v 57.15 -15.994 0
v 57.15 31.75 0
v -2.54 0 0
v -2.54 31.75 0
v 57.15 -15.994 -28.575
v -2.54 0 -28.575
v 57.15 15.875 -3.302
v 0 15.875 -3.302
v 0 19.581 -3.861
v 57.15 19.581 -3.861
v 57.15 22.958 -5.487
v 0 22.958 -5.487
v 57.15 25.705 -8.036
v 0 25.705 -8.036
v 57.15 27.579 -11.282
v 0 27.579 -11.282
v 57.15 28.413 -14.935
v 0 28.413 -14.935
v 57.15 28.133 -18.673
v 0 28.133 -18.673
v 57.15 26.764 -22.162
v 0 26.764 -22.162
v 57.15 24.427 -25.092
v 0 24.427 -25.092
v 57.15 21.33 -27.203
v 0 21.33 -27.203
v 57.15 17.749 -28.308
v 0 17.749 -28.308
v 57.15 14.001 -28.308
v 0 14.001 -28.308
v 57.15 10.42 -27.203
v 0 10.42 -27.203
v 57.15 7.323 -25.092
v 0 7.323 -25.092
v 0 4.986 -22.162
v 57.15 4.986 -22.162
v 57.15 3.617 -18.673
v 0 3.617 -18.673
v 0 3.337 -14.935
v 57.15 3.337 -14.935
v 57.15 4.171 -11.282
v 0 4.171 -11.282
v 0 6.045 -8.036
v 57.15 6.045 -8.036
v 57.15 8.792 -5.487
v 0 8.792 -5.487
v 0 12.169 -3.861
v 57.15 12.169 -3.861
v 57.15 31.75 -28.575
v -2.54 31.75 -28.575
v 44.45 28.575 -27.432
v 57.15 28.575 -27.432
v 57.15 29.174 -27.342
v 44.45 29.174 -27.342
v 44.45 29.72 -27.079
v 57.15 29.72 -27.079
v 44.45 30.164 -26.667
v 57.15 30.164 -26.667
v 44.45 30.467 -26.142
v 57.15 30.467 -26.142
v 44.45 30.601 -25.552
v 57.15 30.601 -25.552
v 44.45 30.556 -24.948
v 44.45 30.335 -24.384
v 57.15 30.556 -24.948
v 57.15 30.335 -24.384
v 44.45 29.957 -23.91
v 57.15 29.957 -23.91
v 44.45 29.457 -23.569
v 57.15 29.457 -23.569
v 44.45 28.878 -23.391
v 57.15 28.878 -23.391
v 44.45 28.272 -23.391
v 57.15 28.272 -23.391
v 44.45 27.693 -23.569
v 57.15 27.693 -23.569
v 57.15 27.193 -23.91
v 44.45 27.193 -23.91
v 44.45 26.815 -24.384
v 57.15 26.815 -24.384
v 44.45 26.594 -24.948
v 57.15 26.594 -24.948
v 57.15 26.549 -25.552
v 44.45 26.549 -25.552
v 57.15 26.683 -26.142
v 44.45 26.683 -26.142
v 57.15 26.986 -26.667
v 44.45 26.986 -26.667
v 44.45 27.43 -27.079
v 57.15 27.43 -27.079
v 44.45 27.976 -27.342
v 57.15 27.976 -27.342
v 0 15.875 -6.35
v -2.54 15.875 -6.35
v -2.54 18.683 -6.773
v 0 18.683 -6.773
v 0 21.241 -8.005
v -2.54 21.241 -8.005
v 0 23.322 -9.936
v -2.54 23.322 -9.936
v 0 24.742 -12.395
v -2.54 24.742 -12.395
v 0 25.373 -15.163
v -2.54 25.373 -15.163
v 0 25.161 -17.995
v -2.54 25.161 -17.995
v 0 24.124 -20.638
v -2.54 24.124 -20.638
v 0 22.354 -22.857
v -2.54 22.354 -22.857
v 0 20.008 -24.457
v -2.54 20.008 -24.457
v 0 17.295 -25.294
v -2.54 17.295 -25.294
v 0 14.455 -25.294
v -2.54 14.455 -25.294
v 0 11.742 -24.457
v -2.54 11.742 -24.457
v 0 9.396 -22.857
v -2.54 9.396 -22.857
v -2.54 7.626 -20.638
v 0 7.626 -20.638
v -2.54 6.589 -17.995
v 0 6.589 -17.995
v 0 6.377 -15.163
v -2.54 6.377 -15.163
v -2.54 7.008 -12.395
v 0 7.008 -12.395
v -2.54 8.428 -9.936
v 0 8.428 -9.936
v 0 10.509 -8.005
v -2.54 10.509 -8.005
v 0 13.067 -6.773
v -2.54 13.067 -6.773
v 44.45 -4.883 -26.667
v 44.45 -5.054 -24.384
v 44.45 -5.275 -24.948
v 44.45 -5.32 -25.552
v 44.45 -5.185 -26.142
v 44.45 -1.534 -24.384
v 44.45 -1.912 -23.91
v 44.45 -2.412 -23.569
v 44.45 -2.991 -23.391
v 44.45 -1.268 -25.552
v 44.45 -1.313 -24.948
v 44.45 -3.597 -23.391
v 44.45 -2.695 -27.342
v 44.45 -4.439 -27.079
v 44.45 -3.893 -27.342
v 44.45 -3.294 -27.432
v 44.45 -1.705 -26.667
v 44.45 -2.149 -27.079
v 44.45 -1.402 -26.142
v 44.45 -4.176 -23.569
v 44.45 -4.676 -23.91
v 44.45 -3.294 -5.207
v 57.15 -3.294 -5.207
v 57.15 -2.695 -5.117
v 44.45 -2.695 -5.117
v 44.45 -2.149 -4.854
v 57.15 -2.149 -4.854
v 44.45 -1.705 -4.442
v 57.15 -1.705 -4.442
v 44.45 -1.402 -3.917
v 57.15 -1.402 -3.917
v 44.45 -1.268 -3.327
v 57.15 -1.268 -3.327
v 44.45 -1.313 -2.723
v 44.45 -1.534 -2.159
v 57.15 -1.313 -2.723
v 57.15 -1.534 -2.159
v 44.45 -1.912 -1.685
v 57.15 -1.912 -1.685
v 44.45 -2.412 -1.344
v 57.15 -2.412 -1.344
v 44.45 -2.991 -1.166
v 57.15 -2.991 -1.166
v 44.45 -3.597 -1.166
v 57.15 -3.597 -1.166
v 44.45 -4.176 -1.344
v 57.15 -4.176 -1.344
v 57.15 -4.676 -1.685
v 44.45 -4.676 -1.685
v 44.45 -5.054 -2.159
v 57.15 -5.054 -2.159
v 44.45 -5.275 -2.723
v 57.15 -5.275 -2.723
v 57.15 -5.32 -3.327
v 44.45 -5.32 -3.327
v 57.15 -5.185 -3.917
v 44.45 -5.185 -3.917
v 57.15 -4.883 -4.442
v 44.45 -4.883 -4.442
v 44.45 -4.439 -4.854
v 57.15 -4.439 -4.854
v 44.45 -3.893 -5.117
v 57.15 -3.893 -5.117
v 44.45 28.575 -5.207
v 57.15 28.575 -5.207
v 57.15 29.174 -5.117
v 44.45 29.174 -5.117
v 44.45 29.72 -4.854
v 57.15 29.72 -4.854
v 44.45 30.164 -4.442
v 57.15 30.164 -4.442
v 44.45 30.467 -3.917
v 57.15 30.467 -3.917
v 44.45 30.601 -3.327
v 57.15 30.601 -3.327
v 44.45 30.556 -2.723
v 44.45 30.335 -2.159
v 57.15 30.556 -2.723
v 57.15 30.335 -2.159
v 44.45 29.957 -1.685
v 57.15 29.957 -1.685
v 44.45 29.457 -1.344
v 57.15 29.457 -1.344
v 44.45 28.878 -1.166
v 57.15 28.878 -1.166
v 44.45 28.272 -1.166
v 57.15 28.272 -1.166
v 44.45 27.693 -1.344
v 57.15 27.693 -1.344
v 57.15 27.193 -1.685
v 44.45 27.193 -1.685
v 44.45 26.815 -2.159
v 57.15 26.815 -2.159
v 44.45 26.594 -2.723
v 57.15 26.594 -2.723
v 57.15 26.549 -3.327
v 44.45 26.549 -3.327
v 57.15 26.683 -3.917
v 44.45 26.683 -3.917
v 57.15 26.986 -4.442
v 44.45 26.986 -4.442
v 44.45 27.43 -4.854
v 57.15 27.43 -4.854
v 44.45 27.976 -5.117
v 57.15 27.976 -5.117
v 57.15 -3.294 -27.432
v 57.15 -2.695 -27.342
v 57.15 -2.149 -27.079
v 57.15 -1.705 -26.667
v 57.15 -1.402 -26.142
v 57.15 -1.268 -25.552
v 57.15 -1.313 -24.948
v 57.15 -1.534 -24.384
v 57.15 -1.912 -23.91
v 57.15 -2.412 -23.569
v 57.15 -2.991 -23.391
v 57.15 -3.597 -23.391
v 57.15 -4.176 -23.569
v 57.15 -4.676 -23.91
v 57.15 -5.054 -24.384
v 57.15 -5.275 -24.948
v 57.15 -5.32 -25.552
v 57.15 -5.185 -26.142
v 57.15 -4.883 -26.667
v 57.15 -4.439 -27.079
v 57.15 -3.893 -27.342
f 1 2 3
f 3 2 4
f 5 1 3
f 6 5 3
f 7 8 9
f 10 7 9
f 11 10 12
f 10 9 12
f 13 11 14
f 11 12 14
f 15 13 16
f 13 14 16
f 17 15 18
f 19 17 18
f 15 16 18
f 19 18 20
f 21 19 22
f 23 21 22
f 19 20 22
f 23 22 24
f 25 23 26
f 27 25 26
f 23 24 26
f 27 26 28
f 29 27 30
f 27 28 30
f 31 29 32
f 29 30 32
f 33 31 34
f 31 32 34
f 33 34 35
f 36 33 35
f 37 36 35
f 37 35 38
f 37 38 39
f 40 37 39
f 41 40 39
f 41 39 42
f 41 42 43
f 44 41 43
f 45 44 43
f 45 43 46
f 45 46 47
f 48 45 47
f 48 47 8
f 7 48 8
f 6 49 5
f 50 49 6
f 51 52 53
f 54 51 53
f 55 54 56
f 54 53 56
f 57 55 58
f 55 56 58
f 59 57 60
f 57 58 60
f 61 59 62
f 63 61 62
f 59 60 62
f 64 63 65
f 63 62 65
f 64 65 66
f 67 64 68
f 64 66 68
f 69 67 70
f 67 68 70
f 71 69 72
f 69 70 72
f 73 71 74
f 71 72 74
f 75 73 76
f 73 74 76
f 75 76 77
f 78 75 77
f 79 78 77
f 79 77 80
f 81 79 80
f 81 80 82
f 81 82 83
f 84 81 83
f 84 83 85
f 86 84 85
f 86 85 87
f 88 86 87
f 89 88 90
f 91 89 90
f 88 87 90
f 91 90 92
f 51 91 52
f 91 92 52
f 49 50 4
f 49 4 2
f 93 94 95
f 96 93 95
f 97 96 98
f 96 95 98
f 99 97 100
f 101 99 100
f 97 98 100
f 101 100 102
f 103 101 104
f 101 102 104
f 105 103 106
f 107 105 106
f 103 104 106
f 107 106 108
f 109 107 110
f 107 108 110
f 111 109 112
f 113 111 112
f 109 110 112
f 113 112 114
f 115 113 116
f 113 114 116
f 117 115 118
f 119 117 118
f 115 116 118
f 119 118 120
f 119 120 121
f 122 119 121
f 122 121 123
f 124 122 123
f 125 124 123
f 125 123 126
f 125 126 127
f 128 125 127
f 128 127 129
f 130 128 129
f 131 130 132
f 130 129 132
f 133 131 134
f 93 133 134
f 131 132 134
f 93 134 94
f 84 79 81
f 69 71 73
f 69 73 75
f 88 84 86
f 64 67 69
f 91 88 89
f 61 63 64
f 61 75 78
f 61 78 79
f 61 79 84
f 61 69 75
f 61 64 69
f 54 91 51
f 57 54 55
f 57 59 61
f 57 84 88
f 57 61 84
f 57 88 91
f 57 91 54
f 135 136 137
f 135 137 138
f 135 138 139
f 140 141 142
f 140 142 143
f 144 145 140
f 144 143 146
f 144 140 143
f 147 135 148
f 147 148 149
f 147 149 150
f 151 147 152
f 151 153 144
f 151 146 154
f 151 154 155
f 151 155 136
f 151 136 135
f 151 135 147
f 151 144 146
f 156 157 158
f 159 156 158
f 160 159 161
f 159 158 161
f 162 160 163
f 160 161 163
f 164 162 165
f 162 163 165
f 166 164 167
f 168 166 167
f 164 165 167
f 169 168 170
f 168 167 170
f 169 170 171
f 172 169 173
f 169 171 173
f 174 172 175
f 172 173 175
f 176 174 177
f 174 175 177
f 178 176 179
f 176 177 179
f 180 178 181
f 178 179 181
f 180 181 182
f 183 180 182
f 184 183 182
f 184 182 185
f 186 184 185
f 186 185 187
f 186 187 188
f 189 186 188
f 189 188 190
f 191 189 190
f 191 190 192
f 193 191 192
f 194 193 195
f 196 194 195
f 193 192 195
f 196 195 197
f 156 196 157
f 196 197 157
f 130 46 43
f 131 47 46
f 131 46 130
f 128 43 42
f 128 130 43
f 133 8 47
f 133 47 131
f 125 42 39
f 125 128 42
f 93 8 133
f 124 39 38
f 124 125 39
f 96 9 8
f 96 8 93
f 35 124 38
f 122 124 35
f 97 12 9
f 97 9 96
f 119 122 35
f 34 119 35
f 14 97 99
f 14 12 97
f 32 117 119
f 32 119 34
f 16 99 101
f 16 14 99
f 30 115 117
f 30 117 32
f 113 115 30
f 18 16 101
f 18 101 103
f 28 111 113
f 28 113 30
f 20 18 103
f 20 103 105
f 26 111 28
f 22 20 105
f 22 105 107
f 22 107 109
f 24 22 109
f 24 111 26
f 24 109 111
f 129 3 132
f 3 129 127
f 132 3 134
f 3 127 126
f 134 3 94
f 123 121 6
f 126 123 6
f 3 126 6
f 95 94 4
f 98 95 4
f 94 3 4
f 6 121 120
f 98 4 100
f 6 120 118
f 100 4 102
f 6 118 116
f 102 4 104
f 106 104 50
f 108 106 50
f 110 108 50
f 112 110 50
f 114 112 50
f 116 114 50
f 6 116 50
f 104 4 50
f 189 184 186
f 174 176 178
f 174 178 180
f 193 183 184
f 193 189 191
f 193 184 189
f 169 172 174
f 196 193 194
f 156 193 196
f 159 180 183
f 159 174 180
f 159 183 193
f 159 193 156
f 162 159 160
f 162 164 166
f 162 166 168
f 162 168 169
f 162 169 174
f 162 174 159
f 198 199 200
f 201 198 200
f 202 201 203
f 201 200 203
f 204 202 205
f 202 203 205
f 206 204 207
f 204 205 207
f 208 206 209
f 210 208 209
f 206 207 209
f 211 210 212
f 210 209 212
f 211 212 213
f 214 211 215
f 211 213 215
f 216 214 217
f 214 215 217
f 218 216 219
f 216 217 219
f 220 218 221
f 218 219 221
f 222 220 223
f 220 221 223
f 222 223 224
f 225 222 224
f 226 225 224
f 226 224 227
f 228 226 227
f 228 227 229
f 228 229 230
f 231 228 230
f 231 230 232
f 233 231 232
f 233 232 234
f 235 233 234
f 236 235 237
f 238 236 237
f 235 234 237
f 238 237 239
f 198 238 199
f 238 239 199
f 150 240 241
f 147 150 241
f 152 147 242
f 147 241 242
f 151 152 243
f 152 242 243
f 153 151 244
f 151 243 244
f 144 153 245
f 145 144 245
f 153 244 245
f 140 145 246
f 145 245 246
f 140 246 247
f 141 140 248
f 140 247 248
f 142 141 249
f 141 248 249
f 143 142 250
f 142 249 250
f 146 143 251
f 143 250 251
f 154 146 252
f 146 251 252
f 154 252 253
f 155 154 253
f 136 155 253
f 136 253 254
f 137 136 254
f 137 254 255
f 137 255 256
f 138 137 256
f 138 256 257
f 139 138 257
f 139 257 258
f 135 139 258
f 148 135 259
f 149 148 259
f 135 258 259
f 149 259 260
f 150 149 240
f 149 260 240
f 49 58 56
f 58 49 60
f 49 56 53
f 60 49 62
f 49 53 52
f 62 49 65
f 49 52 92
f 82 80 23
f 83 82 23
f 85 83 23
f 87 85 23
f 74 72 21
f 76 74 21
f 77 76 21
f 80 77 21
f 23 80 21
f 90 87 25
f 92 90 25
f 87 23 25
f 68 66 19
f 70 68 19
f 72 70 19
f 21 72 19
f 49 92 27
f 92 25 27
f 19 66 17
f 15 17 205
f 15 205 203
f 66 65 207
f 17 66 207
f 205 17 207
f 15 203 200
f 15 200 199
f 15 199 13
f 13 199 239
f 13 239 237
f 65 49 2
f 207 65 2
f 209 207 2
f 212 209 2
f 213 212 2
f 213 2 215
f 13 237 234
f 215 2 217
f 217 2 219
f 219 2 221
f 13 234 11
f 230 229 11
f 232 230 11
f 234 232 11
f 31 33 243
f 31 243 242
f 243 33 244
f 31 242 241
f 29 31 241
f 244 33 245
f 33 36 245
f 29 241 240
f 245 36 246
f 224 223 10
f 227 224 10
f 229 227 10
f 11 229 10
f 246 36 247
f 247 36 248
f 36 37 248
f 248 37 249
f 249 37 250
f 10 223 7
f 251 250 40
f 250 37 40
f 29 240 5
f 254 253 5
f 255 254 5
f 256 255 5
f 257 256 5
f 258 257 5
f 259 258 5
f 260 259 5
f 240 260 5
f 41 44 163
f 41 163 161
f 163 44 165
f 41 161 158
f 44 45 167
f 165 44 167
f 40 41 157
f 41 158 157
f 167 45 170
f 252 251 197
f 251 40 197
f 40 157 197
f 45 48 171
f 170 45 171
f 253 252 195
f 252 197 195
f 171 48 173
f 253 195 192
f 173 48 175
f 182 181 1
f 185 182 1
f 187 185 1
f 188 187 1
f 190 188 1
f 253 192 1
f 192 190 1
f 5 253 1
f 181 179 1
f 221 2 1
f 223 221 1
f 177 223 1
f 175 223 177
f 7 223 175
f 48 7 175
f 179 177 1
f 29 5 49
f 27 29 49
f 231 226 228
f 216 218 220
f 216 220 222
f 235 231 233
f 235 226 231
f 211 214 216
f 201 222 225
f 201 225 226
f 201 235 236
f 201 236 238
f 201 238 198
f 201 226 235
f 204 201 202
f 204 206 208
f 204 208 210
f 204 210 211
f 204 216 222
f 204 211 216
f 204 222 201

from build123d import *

# Parameters (mm, degrees)
SKETCH1_W           = 57.15
SKETCH1_H           = 31.75
BOSS_EXTRUDE1_DEPTH = 28.575
SKETCH2_R           = 12.573
CUT_EXTRUDE1_DEPTH  = 72.349251047
SKETCH3_W           = 2.54
SKETCH3_H           = 28.575
BOSS_EXTRUDE2_DEPTH = 31.75
SKETCH4_R           = 9.525
CUT_EXTRUDE2_DEPTH  = 2.54
BOSS_EXTRUDE3_DEPTH = 28.575
SKETCH6_R           = 2.032
CUT_EXTRUDE3_DEPTH  = 12.7


with BuildPart() as part:
    # Sketch1 → Boss-Extrude1 (new body)
    with BuildSketch(Plane.XY):
        with Locations((28.575, 15.875)):
            Rectangle(SKETCH1_W, SKETCH1_H)
    extrude(amount=-BOSS_EXTRUDE1_DEPTH)

    # Sketch2 → Cut-Extrude1 (cut, through all)
    with BuildSketch(Plane.ZY):
        with Locations((-15.875, 15.875)):
            Circle(SKETCH2_R)
    extrude(amount=-CUT_EXTRUDE1_DEPTH, mode=Mode.SUBTRACT)

    # Sketch3 → Boss-Extrude2 (add)
    with BuildSketch(Plane(origin=(0, 31.75, 0), x_dir=(1, 0, 0), z_dir=(0, 1, 0))):
        with Locations((-1.27, 14.2875)):
            Rectangle(SKETCH3_W, SKETCH3_H)
    extrude(amount=-BOSS_EXTRUDE2_DEPTH)

    # Sketch4 → Cut-Extrude2 (cut)
    with BuildSketch(Plane.ZY.offset(2.54)):
        with Locations((-15.875, 15.875)):
            Circle(SKETCH4_R)
    extrude(amount=-CUT_EXTRUDE2_DEPTH, mode=Mode.SUBTRACT)

    # Sketch5 → Boss-Extrude3 (add)
    with BuildSketch(Plane.XY):
        Polygon((-2.54, 0), (57.15, 0), (57.15, -15.993887296), align=None)
    extrude(amount=-BOSS_EXTRUDE3_DEPTH)

    # Sketch6 → Cut-Extrude3 (cut)
    with BuildSketch(Plane(origin=(57.15, 0, 0), x_dir=(0, 0, -1), z_dir=(1, 0, 0))):
        with Locations((3.175, 28.575)):
            Circle(SKETCH6_R)
        with Locations((25.4, 28.575)):
            Circle(SKETCH6_R)
        with Locations((25.4, -3.293887296)):
            Circle(SKETCH6_R)
        with Locations((3.175, -3.293887296)):
            Circle(SKETCH6_R)
    extrude(amount=-CUT_EXTRUDE3_DEPTH, mode=Mode.SUBTRACT)


solid = part.part
